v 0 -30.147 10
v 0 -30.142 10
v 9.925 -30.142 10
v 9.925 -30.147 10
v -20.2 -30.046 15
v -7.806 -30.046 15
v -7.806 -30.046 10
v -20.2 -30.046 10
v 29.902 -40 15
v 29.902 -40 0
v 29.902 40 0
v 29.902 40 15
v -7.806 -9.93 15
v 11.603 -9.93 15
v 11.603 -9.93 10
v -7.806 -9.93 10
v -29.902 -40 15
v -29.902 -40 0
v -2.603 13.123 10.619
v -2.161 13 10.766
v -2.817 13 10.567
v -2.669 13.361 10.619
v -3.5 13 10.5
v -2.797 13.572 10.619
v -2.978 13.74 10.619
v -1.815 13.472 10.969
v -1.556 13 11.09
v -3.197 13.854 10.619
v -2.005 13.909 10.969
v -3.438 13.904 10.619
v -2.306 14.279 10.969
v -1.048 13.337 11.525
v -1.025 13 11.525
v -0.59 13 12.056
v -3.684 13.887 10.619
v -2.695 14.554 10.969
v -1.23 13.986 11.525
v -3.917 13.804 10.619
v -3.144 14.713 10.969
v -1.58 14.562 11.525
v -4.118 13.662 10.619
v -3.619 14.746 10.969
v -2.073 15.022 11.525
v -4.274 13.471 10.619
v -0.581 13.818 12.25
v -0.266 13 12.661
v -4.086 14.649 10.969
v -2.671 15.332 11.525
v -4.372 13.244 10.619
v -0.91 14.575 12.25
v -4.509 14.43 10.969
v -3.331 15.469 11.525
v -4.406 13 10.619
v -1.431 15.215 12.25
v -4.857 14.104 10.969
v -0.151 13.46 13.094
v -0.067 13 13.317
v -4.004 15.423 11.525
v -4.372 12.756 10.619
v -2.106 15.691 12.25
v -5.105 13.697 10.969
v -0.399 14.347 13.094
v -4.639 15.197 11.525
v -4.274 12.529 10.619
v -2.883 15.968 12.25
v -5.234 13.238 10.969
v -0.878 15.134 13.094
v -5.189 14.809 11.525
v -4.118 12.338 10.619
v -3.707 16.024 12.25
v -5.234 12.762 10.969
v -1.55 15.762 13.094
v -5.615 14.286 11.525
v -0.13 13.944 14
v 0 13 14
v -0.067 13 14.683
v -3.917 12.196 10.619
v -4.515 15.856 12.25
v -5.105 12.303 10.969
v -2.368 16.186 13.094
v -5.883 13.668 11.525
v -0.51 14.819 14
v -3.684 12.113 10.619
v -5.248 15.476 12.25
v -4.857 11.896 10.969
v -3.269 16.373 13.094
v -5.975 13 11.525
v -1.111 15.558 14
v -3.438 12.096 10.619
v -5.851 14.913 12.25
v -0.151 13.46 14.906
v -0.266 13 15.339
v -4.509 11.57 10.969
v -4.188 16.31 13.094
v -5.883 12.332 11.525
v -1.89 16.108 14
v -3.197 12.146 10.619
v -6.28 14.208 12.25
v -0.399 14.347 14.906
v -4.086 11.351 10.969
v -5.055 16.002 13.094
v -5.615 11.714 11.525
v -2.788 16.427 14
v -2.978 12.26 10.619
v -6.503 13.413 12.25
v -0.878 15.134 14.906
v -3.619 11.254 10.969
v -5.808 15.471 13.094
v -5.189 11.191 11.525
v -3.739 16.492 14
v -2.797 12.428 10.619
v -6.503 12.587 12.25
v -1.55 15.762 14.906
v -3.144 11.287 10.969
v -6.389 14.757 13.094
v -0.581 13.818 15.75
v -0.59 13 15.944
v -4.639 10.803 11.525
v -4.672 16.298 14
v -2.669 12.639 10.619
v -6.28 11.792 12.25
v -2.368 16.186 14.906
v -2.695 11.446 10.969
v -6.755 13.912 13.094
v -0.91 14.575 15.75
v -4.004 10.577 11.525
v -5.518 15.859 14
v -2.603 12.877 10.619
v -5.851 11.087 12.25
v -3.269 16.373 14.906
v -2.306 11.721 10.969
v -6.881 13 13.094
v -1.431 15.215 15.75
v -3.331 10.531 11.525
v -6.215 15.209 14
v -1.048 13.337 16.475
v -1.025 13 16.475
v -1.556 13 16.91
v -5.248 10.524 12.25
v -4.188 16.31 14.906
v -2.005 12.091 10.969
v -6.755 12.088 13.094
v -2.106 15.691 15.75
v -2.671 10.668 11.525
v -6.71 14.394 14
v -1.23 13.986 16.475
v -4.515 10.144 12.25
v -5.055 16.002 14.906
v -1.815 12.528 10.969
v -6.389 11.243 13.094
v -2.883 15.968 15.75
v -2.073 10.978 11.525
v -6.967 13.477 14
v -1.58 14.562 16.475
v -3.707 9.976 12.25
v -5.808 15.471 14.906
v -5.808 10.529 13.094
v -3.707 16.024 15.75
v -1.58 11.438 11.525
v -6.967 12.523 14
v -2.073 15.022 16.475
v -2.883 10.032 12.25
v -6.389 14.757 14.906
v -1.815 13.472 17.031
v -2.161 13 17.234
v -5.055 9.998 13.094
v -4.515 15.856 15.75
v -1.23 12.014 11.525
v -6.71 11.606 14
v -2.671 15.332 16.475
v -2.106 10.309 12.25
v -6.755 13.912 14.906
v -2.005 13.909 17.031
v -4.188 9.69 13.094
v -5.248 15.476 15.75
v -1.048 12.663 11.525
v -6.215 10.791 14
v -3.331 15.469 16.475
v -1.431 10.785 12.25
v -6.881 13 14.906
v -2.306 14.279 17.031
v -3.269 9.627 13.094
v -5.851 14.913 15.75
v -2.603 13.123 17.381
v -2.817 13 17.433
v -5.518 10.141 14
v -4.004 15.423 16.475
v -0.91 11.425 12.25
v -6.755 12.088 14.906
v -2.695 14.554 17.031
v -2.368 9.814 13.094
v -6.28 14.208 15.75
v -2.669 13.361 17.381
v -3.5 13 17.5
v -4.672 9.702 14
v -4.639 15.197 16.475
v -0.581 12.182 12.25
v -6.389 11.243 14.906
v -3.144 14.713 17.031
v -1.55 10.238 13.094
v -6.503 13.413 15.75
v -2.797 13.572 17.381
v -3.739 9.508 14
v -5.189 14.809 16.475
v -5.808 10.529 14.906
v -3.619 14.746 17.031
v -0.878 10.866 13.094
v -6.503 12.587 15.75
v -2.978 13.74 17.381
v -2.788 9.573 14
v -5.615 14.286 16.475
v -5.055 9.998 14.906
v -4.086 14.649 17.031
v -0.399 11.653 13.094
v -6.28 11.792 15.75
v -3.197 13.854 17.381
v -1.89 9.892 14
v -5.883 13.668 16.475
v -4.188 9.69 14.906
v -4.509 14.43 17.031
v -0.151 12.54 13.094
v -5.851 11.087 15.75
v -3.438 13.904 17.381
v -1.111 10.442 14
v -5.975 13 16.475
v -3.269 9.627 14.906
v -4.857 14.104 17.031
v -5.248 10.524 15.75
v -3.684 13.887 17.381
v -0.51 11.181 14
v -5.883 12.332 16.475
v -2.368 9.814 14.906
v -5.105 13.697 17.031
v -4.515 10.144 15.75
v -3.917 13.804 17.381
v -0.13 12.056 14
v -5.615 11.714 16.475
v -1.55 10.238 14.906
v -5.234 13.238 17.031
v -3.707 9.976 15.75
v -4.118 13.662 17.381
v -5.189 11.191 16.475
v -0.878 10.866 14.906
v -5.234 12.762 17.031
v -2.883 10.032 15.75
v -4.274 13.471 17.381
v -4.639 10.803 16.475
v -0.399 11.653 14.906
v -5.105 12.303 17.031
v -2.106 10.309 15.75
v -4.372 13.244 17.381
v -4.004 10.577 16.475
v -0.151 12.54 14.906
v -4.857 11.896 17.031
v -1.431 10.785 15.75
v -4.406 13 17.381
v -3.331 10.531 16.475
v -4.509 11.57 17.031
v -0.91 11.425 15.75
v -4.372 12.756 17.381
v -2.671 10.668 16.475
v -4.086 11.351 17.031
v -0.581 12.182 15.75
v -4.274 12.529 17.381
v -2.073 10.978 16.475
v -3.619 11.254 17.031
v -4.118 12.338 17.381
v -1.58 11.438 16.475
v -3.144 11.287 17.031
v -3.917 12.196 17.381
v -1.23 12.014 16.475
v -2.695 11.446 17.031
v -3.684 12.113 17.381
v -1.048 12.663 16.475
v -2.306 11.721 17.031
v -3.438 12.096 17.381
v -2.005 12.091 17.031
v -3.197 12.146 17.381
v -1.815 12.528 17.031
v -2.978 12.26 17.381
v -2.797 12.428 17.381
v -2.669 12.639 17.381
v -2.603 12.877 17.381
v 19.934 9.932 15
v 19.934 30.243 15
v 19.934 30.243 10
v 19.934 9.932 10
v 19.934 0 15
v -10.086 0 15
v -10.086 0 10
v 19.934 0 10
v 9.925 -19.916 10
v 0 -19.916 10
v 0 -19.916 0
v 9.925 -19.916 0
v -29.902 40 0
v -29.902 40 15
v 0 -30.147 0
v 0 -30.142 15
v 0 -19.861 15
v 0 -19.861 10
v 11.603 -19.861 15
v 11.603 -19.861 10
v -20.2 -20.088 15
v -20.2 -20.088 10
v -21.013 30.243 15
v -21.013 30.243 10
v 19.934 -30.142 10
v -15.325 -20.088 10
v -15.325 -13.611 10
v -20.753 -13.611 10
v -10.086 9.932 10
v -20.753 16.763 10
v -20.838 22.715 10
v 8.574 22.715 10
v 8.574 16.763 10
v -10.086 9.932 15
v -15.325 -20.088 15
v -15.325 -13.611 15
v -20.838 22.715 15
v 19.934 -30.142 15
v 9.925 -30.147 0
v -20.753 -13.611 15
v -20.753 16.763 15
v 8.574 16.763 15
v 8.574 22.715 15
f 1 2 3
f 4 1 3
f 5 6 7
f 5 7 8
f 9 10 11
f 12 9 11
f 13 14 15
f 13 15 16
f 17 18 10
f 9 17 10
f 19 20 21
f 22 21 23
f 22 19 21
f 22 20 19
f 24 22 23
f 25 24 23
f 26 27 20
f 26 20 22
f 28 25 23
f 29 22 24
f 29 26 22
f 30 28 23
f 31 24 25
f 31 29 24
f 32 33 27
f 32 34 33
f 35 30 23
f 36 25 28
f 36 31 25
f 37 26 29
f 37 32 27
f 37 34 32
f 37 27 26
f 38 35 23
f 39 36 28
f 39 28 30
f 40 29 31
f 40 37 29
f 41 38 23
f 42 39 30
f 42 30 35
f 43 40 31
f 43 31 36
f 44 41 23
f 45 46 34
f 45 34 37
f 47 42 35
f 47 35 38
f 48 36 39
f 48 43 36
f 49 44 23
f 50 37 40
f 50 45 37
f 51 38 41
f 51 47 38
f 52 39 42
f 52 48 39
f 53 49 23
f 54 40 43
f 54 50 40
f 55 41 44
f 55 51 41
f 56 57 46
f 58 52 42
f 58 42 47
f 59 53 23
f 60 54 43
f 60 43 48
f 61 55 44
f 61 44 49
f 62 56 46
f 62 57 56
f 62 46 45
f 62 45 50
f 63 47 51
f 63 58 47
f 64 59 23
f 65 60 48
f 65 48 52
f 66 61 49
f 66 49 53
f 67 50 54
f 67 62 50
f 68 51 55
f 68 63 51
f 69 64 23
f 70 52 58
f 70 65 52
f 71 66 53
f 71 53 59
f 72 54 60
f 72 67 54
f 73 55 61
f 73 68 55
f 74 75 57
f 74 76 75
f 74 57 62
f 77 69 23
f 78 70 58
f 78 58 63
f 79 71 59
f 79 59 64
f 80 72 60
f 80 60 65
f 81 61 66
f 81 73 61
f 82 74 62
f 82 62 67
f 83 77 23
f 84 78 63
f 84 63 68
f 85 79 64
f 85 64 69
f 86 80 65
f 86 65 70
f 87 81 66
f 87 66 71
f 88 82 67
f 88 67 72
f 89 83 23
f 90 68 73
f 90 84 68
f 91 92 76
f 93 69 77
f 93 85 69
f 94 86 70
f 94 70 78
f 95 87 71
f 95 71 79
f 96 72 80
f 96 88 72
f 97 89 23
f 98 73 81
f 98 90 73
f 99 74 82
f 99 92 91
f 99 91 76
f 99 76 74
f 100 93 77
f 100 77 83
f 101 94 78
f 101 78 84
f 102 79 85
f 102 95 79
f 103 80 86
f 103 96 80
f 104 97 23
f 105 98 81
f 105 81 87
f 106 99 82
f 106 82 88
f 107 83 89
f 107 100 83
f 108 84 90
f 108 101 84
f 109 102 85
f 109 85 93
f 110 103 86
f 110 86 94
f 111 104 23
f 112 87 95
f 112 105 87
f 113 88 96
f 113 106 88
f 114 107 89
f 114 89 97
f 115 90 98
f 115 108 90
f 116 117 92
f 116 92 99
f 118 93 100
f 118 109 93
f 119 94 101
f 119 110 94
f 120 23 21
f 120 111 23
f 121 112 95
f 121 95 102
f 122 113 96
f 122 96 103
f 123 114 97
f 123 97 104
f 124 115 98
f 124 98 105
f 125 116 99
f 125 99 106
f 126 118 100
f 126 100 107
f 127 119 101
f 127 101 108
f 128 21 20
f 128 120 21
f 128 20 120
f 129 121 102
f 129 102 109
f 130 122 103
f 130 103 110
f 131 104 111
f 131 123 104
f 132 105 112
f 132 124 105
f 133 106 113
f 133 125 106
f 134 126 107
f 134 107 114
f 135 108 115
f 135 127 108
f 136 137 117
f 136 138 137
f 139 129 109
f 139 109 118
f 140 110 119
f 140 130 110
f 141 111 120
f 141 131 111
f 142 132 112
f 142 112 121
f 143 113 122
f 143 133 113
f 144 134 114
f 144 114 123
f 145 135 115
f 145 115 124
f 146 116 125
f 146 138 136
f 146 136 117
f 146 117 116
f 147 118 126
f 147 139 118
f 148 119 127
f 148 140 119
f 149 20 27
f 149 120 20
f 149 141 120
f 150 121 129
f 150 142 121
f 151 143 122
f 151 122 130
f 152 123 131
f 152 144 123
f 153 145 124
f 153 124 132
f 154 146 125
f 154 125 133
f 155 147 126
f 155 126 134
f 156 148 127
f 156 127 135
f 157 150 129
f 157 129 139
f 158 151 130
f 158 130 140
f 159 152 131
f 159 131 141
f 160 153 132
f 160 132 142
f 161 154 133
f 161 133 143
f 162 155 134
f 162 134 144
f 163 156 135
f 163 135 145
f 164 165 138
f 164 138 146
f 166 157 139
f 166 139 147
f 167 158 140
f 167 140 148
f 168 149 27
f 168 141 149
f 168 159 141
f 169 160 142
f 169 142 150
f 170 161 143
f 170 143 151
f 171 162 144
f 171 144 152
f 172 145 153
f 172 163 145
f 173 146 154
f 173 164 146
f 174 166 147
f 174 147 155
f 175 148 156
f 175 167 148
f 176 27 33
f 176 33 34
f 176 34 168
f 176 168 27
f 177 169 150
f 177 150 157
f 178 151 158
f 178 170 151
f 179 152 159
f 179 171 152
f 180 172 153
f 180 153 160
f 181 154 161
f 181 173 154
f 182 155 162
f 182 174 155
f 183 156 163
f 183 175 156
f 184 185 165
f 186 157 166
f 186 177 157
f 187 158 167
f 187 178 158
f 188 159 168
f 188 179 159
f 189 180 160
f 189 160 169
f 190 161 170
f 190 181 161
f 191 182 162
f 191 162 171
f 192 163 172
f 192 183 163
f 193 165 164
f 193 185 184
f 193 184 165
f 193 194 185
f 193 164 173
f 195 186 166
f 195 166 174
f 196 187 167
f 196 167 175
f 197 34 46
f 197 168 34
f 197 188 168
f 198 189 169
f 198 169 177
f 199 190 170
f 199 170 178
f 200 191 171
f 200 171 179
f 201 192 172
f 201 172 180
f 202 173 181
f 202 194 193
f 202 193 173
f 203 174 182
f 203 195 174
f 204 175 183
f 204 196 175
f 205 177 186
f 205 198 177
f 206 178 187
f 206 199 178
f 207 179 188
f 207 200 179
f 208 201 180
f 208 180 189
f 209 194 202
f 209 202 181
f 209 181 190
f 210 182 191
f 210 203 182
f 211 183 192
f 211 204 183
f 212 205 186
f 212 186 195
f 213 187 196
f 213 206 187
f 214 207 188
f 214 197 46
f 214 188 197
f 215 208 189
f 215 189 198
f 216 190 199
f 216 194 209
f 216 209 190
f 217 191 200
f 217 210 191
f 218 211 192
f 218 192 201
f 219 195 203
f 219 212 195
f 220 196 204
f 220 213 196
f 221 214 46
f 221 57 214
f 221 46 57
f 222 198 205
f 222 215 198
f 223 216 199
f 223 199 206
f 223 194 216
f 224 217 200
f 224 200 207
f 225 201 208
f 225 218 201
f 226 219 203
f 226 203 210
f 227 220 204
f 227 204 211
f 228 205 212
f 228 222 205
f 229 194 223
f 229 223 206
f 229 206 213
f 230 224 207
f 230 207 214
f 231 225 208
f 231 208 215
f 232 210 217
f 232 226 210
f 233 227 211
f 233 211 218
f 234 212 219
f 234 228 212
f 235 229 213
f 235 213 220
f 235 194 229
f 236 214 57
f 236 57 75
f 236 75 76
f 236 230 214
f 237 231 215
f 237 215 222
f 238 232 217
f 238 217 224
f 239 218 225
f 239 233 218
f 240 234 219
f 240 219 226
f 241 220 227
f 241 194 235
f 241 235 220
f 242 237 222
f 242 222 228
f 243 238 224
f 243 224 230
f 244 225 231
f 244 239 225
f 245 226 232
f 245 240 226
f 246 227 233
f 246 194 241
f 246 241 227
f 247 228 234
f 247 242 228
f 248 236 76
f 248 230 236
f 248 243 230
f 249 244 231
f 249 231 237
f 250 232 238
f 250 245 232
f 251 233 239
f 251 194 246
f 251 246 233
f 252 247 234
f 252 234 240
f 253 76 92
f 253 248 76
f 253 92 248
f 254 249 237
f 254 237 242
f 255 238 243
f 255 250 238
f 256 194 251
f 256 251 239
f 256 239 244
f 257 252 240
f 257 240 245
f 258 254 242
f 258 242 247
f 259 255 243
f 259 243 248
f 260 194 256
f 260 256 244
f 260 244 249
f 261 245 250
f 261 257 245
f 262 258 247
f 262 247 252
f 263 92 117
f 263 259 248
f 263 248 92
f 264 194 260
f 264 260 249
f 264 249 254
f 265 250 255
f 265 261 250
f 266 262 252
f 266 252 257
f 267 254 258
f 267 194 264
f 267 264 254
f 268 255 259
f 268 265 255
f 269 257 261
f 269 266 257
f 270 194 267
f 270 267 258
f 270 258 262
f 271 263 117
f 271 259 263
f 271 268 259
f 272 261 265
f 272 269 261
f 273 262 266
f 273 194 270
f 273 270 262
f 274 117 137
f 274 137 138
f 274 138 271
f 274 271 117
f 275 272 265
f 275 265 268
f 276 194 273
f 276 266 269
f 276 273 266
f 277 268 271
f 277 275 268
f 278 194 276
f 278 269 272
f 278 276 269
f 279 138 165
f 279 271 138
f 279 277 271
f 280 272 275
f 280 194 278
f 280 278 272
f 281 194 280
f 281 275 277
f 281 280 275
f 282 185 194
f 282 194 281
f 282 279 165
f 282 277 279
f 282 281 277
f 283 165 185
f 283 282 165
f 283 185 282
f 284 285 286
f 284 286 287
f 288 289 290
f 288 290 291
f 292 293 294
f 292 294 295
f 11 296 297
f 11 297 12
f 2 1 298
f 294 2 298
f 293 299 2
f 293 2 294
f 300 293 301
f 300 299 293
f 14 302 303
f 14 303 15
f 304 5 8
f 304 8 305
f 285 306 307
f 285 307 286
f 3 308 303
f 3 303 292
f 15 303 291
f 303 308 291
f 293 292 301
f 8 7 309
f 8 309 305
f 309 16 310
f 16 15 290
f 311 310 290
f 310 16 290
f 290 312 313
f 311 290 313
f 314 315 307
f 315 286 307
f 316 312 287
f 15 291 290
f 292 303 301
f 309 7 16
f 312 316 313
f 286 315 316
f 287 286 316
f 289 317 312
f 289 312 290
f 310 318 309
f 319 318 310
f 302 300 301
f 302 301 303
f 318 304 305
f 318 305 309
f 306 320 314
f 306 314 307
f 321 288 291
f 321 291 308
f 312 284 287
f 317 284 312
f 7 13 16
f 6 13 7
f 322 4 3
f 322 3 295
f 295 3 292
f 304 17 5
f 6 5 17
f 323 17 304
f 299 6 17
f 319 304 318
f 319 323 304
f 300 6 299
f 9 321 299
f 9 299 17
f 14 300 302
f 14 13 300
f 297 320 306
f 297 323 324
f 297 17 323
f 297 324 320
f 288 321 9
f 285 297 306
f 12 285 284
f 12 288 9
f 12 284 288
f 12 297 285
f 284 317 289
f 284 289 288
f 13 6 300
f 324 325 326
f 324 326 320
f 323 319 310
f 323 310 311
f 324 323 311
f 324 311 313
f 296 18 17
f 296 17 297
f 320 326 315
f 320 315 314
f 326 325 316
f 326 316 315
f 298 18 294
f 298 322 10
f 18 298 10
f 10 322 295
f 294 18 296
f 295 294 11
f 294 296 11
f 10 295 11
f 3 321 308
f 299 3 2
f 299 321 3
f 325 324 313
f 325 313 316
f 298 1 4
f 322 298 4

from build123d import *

# Parameters (mm, degrees)
SKETCH_W        = 59.803931
SKETCH_H        = 79.999997
PAD_DEPTH       = 15
POCKET_DEPTH    = 5
SKETCH002_W     = 9.925324
SKETCH002_H     = 10.231159
POCKET001_DEPTH = 20


with BuildPart() as cos:
    # Sketch → Pad (new body)
    with BuildSketch(Plane.XY):
        with Locations((-7e-05, 0.000155)):
            Rectangle(SKETCH_W, SKETCH_H)
    extrude(amount=PAD_DEPTH)

    # Sketch001 (on Face6 of Pad) → Pocket (cut)
    with BuildSketch(Plane.XY.offset(15)):
        Polygon((-21.01289, 30.243032), (19.933664, 30.243032), (19.933664, 9.931581), (-10.086459, 9.931581), (-10.086459, 0), (19.933664, 0), (19.933664, -30.141647), (0, -30.141647), (0, -19.861084), (11.602569, -19.861084), (11.602569, -9.929664), (-7.8056, -9.929664), (-7.8056, -30.045567), (-20.199926, -30.045567), (-20.199926, -20.088192), (-15.325379, -20.088192), (-15.325379, -13.610632), (-20.752523, -13.610632), (-20.752523, 16.762701), (8.573809, 16.762701), (8.573809, 22.715054), (-20.837824, 22.715054), align=None)
    extrude(amount=-POCKET_DEPTH, mode=Mode.SUBTRACT)

    # Sketch002 (on Face29 of Pocket) → Pocket001 (cut)
    with BuildSketch(Plane.XY.offset(10)):
        with Locations((4.962662, -25.031747)):
            Rectangle(SKETCH002_W, SKETCH002_H)
    extrude(amount=-POCKET001_DEPTH, mode=Mode.SUBTRACT)


with BuildPart() as esfera:
    # Sphere → Sphere (revolve)
    with BuildSketch(Plane(origin=(-3.5, 13, 14), x_dir=(1, 0, 0), z_dir=(0, -1, 0))):
        with BuildLine():
            ThreePointArc((0, -3.5), (3.5, 0), (0, 3.5))
            Line((0, 3.5), (0, -3.5))
        make_face()
    revolve(axis=Axis((-3.5, 13, 14), (0, 0, 1)))


solid = Compound([cos.part, esfera.part])
